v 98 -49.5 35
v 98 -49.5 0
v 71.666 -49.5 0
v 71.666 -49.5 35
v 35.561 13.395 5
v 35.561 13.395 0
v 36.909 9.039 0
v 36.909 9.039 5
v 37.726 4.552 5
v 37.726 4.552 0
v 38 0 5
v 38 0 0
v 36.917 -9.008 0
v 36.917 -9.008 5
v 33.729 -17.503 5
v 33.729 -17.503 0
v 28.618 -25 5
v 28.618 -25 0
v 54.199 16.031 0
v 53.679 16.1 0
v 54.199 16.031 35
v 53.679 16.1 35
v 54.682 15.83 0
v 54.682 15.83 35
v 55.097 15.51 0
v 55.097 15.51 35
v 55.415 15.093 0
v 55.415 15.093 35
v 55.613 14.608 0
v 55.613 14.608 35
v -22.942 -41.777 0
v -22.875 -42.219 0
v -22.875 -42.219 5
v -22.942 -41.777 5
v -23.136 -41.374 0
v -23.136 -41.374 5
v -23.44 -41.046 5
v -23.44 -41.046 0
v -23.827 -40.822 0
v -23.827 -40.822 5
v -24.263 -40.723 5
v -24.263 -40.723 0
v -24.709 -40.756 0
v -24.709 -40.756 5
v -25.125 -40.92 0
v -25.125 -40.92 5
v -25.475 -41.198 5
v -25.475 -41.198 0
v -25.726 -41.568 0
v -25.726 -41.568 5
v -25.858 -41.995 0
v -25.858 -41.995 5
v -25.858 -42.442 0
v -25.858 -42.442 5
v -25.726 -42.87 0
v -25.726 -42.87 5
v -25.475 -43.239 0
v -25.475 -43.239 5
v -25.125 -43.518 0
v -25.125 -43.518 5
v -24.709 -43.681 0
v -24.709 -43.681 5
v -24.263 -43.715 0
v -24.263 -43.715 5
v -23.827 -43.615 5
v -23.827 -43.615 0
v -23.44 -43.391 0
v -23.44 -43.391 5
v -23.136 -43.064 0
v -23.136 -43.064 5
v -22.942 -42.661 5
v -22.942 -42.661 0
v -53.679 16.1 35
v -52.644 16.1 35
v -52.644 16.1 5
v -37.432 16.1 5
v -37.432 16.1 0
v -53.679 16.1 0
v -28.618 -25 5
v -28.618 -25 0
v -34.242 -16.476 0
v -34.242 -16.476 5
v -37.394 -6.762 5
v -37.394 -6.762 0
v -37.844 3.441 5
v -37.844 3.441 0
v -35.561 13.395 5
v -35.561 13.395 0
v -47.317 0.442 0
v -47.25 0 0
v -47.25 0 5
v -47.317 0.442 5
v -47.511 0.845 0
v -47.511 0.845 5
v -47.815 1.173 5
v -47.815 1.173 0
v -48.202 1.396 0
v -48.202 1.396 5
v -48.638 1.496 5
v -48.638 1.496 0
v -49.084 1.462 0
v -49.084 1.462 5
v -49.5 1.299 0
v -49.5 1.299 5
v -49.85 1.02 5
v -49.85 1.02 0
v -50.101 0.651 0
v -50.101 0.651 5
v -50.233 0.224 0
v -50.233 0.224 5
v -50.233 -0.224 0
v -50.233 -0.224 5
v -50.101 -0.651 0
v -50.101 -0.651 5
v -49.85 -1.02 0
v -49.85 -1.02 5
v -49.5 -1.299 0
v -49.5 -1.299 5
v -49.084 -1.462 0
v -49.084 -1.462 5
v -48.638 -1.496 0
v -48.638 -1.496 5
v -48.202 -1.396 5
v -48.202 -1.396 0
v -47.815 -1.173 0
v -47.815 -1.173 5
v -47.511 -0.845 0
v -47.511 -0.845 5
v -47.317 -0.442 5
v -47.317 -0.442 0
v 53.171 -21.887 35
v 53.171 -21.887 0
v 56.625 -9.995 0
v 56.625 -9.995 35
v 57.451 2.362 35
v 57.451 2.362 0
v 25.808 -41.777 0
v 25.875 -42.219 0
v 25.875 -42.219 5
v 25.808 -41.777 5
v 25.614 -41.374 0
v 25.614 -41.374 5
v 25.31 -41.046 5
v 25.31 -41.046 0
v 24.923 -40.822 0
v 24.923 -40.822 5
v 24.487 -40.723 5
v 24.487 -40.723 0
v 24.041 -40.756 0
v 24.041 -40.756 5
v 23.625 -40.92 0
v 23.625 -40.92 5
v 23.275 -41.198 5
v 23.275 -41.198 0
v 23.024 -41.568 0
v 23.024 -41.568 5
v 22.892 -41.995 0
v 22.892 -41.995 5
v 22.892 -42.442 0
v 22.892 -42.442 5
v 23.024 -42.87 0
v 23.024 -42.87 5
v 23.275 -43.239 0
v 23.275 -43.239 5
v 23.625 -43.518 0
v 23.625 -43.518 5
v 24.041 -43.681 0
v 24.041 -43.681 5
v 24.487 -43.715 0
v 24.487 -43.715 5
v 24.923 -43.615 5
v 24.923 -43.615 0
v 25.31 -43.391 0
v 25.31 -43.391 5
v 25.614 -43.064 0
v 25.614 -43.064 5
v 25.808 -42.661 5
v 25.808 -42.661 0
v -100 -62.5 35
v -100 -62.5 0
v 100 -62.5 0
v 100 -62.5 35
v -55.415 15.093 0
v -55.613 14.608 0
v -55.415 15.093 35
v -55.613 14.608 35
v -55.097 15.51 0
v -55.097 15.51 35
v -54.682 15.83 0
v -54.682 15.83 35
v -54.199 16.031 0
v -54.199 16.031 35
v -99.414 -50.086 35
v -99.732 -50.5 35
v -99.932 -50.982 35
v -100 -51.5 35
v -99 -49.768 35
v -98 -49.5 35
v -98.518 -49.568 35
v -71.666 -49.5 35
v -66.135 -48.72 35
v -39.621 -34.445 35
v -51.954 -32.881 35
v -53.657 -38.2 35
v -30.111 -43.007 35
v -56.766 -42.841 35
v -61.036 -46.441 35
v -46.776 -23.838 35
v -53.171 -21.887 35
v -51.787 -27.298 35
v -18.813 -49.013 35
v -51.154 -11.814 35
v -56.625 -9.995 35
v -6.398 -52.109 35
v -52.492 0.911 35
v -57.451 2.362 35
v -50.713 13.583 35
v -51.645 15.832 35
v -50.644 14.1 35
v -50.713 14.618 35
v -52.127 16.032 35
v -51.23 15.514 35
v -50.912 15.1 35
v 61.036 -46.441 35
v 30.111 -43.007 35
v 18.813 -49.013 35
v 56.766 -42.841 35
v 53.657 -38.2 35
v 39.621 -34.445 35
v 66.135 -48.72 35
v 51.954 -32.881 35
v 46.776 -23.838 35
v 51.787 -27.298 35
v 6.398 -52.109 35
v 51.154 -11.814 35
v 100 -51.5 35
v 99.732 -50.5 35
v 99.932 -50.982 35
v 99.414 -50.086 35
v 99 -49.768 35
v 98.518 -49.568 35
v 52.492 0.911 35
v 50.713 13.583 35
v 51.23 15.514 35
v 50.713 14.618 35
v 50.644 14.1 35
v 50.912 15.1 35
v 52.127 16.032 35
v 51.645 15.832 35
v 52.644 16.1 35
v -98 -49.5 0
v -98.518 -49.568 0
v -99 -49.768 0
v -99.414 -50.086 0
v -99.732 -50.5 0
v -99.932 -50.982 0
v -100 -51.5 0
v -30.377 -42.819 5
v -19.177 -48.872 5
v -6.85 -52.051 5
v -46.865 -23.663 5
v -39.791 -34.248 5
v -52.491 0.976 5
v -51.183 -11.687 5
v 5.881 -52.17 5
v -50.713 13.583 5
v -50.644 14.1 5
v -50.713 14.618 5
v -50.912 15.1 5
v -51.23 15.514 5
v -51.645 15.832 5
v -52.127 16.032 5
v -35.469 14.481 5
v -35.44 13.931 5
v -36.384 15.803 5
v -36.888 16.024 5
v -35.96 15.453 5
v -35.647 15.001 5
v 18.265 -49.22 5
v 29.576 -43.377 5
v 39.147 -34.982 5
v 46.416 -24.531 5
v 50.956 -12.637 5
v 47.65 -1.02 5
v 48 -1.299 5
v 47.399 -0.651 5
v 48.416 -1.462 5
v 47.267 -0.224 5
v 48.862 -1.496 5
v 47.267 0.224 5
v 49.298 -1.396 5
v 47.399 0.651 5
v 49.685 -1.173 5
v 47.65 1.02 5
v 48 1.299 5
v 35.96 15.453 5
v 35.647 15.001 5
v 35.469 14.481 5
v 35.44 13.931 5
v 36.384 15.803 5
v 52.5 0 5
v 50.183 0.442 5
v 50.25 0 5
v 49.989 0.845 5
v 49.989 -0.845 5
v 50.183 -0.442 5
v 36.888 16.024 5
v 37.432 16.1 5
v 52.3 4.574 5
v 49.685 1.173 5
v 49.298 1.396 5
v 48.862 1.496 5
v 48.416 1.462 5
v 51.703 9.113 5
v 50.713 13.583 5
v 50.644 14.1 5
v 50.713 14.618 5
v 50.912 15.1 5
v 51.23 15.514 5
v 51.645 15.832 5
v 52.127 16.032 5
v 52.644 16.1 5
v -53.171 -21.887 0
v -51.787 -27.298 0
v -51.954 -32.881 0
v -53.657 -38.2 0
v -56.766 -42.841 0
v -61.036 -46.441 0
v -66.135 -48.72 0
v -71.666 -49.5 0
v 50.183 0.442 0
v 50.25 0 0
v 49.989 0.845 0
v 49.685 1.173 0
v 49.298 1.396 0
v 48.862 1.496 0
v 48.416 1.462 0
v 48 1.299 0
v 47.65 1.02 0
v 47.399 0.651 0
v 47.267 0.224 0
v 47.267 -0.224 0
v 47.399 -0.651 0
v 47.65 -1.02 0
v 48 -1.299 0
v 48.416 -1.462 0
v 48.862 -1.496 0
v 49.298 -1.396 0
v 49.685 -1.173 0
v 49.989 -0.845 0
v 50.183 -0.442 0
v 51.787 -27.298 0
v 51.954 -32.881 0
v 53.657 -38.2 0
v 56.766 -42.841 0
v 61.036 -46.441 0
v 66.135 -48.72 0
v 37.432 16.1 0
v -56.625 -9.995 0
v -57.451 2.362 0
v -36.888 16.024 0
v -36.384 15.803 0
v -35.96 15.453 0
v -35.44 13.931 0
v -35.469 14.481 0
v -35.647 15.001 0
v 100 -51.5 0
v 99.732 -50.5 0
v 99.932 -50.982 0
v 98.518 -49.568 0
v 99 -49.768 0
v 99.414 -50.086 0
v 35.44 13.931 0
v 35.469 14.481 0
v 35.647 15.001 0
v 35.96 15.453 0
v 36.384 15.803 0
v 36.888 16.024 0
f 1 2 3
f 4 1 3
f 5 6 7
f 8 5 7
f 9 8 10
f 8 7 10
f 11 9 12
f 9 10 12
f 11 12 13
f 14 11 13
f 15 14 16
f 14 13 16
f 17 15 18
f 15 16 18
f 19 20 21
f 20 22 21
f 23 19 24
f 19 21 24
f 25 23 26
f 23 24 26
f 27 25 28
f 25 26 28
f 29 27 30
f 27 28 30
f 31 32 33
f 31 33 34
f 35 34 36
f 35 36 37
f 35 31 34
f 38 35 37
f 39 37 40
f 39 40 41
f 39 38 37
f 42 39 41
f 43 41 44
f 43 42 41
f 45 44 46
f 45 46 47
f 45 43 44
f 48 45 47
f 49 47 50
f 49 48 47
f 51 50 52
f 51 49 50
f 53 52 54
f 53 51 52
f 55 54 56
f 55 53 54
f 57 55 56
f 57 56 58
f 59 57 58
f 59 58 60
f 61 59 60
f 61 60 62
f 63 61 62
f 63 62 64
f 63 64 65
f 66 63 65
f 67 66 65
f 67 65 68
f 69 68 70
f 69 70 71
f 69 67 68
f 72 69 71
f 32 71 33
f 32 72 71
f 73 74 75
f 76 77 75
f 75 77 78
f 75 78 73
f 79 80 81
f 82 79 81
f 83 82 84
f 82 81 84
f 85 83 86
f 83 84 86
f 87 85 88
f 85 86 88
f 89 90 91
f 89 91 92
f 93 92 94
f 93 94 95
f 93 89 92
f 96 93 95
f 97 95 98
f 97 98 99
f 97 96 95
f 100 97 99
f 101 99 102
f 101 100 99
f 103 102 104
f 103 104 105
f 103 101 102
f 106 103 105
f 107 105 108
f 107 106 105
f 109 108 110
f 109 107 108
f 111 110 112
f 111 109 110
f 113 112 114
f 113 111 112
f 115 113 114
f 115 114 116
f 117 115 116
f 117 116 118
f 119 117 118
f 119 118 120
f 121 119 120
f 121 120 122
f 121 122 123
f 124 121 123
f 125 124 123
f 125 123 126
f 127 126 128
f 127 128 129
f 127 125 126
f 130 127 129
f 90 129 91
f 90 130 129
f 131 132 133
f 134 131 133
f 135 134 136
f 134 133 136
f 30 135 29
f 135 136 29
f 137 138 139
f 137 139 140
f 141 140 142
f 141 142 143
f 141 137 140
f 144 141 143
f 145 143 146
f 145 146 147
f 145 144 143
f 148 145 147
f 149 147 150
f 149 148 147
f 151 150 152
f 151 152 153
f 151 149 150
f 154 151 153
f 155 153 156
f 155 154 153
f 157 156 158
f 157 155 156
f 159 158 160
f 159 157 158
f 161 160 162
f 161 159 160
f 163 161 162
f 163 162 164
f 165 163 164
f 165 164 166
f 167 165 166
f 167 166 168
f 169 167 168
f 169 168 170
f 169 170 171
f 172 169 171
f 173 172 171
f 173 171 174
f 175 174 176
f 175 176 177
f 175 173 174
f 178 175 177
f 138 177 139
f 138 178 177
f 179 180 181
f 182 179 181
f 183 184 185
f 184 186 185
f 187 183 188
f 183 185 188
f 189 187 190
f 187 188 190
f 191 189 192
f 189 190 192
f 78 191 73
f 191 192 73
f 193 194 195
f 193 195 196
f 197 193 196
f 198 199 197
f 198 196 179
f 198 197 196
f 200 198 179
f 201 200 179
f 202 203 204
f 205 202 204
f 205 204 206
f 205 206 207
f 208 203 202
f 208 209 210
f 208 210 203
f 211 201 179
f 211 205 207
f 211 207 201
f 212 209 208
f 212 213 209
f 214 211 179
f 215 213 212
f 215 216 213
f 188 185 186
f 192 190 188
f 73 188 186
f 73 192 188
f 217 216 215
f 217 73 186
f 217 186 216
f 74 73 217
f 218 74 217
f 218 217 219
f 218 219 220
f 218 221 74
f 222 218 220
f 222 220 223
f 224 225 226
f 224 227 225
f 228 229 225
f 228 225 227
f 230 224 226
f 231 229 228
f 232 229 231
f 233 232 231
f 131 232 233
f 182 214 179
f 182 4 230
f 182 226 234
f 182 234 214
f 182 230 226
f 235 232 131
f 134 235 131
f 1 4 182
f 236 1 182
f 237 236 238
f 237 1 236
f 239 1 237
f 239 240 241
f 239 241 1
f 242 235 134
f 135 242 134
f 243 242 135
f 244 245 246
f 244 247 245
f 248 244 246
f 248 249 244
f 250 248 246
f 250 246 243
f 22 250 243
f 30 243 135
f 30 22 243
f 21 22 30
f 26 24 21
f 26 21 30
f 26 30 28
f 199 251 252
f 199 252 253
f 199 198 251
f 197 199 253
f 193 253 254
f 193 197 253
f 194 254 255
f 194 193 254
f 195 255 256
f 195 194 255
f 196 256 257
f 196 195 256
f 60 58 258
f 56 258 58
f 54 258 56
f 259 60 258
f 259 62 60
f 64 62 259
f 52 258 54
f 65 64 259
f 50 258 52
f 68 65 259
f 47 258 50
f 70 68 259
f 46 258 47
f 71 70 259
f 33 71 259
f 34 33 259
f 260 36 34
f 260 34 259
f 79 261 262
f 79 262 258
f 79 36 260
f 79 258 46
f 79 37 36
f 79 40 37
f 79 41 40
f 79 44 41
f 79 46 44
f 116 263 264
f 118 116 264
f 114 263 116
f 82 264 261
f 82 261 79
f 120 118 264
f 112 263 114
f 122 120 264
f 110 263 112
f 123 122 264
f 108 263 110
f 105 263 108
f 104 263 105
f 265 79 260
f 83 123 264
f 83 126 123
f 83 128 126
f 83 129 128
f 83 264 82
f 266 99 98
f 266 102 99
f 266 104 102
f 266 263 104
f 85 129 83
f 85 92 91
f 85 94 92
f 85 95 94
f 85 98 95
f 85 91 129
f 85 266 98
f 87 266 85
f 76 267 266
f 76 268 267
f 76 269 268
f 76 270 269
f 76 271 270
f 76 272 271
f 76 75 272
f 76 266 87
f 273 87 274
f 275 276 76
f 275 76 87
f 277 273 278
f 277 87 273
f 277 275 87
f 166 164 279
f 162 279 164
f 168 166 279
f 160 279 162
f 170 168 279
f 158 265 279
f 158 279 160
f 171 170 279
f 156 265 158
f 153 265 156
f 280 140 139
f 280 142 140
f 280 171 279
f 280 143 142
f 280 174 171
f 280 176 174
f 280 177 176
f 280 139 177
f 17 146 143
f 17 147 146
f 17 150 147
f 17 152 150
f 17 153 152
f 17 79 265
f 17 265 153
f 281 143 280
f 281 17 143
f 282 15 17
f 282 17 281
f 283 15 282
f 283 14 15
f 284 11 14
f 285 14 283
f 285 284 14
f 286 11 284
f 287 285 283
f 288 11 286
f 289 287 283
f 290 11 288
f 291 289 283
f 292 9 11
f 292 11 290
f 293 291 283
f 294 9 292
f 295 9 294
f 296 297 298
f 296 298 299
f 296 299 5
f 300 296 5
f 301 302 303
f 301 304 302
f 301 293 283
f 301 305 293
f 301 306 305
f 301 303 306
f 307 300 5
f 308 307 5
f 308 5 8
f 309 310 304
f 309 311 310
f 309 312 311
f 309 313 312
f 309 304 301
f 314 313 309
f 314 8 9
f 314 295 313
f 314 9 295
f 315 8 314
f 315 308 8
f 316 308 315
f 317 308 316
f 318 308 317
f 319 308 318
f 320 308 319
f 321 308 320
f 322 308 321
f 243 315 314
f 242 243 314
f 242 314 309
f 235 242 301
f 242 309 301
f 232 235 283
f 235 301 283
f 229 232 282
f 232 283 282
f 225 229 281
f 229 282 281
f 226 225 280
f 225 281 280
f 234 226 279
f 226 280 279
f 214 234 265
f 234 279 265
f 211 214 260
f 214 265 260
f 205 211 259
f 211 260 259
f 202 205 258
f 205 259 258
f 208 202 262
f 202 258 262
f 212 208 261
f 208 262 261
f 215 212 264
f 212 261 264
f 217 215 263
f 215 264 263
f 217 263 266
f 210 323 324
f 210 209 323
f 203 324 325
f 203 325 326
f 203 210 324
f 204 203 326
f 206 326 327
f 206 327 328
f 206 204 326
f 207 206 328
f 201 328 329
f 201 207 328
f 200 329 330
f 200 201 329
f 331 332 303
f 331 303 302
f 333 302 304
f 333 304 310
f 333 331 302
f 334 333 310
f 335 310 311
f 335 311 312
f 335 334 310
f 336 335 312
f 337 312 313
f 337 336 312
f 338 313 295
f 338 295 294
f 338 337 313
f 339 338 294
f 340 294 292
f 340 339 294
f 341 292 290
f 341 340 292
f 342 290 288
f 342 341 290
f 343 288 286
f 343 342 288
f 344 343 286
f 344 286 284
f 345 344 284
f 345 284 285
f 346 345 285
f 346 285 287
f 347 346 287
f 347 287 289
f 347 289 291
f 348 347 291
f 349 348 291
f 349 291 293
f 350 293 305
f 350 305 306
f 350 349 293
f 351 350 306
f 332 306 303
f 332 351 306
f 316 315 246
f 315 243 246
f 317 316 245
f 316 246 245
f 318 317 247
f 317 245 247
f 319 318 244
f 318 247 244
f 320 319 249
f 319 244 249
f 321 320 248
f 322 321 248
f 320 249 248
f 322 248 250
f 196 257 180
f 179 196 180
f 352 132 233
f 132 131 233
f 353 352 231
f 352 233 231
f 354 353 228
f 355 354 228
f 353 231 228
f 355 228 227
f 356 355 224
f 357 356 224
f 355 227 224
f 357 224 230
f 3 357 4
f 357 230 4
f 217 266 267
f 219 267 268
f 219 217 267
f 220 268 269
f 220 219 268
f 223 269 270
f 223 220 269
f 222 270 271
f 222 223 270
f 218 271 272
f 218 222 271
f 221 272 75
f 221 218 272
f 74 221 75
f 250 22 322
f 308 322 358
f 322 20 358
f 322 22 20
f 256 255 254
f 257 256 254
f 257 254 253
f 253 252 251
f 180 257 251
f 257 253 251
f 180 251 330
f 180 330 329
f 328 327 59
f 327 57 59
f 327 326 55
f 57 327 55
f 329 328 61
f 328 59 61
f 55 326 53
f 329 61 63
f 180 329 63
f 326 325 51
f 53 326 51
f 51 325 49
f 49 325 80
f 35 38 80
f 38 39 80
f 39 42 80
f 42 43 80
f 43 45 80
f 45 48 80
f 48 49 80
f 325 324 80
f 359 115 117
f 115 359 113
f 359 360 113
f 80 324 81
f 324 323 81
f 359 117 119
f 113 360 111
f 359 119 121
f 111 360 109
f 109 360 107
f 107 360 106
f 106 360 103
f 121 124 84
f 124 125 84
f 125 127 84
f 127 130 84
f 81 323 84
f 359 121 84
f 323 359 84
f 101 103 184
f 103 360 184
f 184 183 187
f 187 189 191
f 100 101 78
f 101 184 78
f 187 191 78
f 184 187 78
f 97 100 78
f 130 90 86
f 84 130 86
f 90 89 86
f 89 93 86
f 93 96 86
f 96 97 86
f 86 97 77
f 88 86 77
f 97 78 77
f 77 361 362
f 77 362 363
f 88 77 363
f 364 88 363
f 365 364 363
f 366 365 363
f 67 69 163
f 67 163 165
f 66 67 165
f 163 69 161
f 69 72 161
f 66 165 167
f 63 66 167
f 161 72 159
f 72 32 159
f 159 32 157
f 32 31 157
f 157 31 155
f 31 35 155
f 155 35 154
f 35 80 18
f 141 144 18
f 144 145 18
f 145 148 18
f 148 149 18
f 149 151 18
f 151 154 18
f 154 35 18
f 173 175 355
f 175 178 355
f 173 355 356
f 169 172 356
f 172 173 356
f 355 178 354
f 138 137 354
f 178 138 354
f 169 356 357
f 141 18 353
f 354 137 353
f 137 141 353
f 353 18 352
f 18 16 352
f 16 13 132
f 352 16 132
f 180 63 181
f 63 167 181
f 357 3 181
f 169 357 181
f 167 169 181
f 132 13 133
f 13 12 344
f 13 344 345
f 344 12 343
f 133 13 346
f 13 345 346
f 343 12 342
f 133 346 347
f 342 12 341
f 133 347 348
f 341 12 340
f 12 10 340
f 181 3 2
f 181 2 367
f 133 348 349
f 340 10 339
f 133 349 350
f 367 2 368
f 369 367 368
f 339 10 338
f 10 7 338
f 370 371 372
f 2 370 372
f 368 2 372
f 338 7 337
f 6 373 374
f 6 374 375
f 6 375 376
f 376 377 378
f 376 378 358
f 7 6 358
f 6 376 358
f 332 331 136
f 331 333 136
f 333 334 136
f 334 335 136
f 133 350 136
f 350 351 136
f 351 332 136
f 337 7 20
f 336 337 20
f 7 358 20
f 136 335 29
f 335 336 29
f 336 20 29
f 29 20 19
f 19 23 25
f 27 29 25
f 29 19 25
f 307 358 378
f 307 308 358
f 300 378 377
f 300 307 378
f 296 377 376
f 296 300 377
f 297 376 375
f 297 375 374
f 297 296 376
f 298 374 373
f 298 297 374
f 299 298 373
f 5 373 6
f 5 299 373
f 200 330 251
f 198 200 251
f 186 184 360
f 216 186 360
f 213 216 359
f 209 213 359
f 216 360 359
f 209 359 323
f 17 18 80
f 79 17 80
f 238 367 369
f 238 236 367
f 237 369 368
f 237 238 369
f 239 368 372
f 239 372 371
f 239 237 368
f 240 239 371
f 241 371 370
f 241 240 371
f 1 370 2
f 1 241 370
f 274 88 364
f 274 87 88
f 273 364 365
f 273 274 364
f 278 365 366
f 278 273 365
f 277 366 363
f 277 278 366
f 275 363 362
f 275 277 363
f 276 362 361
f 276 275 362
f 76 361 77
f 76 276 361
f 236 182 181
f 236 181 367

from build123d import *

# Parameters (mm, degrees)
SKETCH2_R           = 1.5
BOSS_EXTRUDE1_DEPTH = 5
BOSS_EXTRUDE2_DEPTH = 35
FILLET1_R           = 2
SKETCH5_W           = 200
SKETCH5_H           = 5
BOSS_EXTRUDE3_DEPTH = 35
FILLET2_R           = 20
FILLET3_R           = 2


with BuildPart() as part:
    # Sketch2 → Boss-Extrude1 (new body)
    # profile 1 of 2: a face of its own
    with BuildSketch(Plane.XY):
        with BuildLine():
            Line((-34.420778608, 16.1), (-49.970391233, 16.1))
            ThreePointArc((-49.970391233, 16.1), (-8.148756355, -51.863742343), (52.5, 0))
            ThreePointArc((52.5, 0), (51.863742343, 8.148756355), (49.970391233, 16.1))
            Line((49.970391233, 16.1), (34.420778608, 16.1))
            ThreePointArc((34.420778608, 16.1), (37.094403804, 8.246526932), (38, 0))
            ThreePointArc((38, 0), (35.577315031, -13.35120426), (28.618176043, -25))
            ThreePointArc((28.618176043, -25), (0, -38), (-28.618176043, -25))
            ThreePointArc((-28.618176043, -25), (-37.626851461, -5.312254619), (-34.420778608, 16.1))
        make_face()
        with Locations((-24.375, -42.218738434)):
            Circle(SKETCH2_R, mode=Mode.SUBTRACT)
        with Locations((-48.75, 0)):
            Circle(SKETCH2_R, mode=Mode.SUBTRACT)
        with Locations((24.375, -42.218738434)):
            Circle(SKETCH2_R, mode=Mode.SUBTRACT)
        with Locations((48.75, 0)):
            Circle(SKETCH2_R, mode=Mode.SUBTRACT)
    # profile 2 of 2: a face of its own
    with BuildSketch(Plane.XY):
        with BuildLine():
            Line((28.618176043, -25), (-28.618176043, -25))
            ThreePointArc((-28.618176043, -25), (0, -38), (28.618176043, -25))
        make_face()
    extrude(amount=BOSS_EXTRUDE1_DEPTH)

    # Sketch4 → Boss-Extrude2 (add)
    with BuildSketch(Plane.XY):
        with BuildLine():
            ThreePointArc((49.970391233, 16.1), (0, -52.5), (-49.970391233, 16.1))
            Line((-49.970391233, 16.1), (-55.2, 16.1))
            ThreePointArc((-55.2, 16.1), (0, -57.5), (55.2, 16.1))
            Line((55.2, 16.1), (49.970391233, 16.1))
        make_face()
    extrude(amount=BOSS_EXTRUDE2_DEPTH)

    # Fillet1
    fillet1_edges = [part.edges().sort_by_distance(p)[0] for p in [
        (34.420778608, 16.1, 2.5),
        (-34.420778608, 16.1, 2.5),
        (-49.970391233, 16.1, 20),
        (-55.2, 16.1, 17.5),
        (55.2, 16.1, 17.5),
        (49.970391233, 16.1, 20),
    ]]
    fillet(fillet1_edges, radius=FILLET1_R)

    # Sketch5 → Boss-Extrude3 (add)
    with BuildSketch(Plane.XY):
        with BuildLine():
            Line((-100, -57.5), (3.75e-07, -57.5))
            ThreePointArc((3.75e-07, -57.5), (-15.165750707, -55.463952307), (-29.257477677, -49.5))
            Line((-29.257477677, -49.5), (-100, -49.5))
            Line((-100, -49.5), (-100, -57.5))
        make_face()
        with BuildLine():
            Line((3.75e-07, -57.5), (100, -57.5))
            Line((100, -57.5), (100, -49.5))
            Line((100, -49.5), (29.257477677, -49.5))
            ThreePointArc((29.257477677, -49.5), (15.165751069, -55.463952208), (3.75e-07, -57.5))
        make_face()
        with Locations((0, -60)):
            Rectangle(SKETCH5_W, SKETCH5_H)
    extrude(amount=BOSS_EXTRUDE3_DEPTH)

    # Fillet2
    fillet2_edges = [part.edges().sort_by_distance(p)[0] for p in [
        (-29.257477677, -49.5, 17.5),
        (29.257477677, -49.5, 17.5),
    ]]
    fillet(fillet2_edges, radius=FILLET2_R)

    # Fillet3
    fillet3_edges = [part.edges().sort_by_distance(p)[0] for p in [
        (100, -49.5, 17.5),
        (-100, -49.5, 17.5),
    ]]
    fillet(fillet3_edges, radius=FILLET3_R)


solid = part.part
